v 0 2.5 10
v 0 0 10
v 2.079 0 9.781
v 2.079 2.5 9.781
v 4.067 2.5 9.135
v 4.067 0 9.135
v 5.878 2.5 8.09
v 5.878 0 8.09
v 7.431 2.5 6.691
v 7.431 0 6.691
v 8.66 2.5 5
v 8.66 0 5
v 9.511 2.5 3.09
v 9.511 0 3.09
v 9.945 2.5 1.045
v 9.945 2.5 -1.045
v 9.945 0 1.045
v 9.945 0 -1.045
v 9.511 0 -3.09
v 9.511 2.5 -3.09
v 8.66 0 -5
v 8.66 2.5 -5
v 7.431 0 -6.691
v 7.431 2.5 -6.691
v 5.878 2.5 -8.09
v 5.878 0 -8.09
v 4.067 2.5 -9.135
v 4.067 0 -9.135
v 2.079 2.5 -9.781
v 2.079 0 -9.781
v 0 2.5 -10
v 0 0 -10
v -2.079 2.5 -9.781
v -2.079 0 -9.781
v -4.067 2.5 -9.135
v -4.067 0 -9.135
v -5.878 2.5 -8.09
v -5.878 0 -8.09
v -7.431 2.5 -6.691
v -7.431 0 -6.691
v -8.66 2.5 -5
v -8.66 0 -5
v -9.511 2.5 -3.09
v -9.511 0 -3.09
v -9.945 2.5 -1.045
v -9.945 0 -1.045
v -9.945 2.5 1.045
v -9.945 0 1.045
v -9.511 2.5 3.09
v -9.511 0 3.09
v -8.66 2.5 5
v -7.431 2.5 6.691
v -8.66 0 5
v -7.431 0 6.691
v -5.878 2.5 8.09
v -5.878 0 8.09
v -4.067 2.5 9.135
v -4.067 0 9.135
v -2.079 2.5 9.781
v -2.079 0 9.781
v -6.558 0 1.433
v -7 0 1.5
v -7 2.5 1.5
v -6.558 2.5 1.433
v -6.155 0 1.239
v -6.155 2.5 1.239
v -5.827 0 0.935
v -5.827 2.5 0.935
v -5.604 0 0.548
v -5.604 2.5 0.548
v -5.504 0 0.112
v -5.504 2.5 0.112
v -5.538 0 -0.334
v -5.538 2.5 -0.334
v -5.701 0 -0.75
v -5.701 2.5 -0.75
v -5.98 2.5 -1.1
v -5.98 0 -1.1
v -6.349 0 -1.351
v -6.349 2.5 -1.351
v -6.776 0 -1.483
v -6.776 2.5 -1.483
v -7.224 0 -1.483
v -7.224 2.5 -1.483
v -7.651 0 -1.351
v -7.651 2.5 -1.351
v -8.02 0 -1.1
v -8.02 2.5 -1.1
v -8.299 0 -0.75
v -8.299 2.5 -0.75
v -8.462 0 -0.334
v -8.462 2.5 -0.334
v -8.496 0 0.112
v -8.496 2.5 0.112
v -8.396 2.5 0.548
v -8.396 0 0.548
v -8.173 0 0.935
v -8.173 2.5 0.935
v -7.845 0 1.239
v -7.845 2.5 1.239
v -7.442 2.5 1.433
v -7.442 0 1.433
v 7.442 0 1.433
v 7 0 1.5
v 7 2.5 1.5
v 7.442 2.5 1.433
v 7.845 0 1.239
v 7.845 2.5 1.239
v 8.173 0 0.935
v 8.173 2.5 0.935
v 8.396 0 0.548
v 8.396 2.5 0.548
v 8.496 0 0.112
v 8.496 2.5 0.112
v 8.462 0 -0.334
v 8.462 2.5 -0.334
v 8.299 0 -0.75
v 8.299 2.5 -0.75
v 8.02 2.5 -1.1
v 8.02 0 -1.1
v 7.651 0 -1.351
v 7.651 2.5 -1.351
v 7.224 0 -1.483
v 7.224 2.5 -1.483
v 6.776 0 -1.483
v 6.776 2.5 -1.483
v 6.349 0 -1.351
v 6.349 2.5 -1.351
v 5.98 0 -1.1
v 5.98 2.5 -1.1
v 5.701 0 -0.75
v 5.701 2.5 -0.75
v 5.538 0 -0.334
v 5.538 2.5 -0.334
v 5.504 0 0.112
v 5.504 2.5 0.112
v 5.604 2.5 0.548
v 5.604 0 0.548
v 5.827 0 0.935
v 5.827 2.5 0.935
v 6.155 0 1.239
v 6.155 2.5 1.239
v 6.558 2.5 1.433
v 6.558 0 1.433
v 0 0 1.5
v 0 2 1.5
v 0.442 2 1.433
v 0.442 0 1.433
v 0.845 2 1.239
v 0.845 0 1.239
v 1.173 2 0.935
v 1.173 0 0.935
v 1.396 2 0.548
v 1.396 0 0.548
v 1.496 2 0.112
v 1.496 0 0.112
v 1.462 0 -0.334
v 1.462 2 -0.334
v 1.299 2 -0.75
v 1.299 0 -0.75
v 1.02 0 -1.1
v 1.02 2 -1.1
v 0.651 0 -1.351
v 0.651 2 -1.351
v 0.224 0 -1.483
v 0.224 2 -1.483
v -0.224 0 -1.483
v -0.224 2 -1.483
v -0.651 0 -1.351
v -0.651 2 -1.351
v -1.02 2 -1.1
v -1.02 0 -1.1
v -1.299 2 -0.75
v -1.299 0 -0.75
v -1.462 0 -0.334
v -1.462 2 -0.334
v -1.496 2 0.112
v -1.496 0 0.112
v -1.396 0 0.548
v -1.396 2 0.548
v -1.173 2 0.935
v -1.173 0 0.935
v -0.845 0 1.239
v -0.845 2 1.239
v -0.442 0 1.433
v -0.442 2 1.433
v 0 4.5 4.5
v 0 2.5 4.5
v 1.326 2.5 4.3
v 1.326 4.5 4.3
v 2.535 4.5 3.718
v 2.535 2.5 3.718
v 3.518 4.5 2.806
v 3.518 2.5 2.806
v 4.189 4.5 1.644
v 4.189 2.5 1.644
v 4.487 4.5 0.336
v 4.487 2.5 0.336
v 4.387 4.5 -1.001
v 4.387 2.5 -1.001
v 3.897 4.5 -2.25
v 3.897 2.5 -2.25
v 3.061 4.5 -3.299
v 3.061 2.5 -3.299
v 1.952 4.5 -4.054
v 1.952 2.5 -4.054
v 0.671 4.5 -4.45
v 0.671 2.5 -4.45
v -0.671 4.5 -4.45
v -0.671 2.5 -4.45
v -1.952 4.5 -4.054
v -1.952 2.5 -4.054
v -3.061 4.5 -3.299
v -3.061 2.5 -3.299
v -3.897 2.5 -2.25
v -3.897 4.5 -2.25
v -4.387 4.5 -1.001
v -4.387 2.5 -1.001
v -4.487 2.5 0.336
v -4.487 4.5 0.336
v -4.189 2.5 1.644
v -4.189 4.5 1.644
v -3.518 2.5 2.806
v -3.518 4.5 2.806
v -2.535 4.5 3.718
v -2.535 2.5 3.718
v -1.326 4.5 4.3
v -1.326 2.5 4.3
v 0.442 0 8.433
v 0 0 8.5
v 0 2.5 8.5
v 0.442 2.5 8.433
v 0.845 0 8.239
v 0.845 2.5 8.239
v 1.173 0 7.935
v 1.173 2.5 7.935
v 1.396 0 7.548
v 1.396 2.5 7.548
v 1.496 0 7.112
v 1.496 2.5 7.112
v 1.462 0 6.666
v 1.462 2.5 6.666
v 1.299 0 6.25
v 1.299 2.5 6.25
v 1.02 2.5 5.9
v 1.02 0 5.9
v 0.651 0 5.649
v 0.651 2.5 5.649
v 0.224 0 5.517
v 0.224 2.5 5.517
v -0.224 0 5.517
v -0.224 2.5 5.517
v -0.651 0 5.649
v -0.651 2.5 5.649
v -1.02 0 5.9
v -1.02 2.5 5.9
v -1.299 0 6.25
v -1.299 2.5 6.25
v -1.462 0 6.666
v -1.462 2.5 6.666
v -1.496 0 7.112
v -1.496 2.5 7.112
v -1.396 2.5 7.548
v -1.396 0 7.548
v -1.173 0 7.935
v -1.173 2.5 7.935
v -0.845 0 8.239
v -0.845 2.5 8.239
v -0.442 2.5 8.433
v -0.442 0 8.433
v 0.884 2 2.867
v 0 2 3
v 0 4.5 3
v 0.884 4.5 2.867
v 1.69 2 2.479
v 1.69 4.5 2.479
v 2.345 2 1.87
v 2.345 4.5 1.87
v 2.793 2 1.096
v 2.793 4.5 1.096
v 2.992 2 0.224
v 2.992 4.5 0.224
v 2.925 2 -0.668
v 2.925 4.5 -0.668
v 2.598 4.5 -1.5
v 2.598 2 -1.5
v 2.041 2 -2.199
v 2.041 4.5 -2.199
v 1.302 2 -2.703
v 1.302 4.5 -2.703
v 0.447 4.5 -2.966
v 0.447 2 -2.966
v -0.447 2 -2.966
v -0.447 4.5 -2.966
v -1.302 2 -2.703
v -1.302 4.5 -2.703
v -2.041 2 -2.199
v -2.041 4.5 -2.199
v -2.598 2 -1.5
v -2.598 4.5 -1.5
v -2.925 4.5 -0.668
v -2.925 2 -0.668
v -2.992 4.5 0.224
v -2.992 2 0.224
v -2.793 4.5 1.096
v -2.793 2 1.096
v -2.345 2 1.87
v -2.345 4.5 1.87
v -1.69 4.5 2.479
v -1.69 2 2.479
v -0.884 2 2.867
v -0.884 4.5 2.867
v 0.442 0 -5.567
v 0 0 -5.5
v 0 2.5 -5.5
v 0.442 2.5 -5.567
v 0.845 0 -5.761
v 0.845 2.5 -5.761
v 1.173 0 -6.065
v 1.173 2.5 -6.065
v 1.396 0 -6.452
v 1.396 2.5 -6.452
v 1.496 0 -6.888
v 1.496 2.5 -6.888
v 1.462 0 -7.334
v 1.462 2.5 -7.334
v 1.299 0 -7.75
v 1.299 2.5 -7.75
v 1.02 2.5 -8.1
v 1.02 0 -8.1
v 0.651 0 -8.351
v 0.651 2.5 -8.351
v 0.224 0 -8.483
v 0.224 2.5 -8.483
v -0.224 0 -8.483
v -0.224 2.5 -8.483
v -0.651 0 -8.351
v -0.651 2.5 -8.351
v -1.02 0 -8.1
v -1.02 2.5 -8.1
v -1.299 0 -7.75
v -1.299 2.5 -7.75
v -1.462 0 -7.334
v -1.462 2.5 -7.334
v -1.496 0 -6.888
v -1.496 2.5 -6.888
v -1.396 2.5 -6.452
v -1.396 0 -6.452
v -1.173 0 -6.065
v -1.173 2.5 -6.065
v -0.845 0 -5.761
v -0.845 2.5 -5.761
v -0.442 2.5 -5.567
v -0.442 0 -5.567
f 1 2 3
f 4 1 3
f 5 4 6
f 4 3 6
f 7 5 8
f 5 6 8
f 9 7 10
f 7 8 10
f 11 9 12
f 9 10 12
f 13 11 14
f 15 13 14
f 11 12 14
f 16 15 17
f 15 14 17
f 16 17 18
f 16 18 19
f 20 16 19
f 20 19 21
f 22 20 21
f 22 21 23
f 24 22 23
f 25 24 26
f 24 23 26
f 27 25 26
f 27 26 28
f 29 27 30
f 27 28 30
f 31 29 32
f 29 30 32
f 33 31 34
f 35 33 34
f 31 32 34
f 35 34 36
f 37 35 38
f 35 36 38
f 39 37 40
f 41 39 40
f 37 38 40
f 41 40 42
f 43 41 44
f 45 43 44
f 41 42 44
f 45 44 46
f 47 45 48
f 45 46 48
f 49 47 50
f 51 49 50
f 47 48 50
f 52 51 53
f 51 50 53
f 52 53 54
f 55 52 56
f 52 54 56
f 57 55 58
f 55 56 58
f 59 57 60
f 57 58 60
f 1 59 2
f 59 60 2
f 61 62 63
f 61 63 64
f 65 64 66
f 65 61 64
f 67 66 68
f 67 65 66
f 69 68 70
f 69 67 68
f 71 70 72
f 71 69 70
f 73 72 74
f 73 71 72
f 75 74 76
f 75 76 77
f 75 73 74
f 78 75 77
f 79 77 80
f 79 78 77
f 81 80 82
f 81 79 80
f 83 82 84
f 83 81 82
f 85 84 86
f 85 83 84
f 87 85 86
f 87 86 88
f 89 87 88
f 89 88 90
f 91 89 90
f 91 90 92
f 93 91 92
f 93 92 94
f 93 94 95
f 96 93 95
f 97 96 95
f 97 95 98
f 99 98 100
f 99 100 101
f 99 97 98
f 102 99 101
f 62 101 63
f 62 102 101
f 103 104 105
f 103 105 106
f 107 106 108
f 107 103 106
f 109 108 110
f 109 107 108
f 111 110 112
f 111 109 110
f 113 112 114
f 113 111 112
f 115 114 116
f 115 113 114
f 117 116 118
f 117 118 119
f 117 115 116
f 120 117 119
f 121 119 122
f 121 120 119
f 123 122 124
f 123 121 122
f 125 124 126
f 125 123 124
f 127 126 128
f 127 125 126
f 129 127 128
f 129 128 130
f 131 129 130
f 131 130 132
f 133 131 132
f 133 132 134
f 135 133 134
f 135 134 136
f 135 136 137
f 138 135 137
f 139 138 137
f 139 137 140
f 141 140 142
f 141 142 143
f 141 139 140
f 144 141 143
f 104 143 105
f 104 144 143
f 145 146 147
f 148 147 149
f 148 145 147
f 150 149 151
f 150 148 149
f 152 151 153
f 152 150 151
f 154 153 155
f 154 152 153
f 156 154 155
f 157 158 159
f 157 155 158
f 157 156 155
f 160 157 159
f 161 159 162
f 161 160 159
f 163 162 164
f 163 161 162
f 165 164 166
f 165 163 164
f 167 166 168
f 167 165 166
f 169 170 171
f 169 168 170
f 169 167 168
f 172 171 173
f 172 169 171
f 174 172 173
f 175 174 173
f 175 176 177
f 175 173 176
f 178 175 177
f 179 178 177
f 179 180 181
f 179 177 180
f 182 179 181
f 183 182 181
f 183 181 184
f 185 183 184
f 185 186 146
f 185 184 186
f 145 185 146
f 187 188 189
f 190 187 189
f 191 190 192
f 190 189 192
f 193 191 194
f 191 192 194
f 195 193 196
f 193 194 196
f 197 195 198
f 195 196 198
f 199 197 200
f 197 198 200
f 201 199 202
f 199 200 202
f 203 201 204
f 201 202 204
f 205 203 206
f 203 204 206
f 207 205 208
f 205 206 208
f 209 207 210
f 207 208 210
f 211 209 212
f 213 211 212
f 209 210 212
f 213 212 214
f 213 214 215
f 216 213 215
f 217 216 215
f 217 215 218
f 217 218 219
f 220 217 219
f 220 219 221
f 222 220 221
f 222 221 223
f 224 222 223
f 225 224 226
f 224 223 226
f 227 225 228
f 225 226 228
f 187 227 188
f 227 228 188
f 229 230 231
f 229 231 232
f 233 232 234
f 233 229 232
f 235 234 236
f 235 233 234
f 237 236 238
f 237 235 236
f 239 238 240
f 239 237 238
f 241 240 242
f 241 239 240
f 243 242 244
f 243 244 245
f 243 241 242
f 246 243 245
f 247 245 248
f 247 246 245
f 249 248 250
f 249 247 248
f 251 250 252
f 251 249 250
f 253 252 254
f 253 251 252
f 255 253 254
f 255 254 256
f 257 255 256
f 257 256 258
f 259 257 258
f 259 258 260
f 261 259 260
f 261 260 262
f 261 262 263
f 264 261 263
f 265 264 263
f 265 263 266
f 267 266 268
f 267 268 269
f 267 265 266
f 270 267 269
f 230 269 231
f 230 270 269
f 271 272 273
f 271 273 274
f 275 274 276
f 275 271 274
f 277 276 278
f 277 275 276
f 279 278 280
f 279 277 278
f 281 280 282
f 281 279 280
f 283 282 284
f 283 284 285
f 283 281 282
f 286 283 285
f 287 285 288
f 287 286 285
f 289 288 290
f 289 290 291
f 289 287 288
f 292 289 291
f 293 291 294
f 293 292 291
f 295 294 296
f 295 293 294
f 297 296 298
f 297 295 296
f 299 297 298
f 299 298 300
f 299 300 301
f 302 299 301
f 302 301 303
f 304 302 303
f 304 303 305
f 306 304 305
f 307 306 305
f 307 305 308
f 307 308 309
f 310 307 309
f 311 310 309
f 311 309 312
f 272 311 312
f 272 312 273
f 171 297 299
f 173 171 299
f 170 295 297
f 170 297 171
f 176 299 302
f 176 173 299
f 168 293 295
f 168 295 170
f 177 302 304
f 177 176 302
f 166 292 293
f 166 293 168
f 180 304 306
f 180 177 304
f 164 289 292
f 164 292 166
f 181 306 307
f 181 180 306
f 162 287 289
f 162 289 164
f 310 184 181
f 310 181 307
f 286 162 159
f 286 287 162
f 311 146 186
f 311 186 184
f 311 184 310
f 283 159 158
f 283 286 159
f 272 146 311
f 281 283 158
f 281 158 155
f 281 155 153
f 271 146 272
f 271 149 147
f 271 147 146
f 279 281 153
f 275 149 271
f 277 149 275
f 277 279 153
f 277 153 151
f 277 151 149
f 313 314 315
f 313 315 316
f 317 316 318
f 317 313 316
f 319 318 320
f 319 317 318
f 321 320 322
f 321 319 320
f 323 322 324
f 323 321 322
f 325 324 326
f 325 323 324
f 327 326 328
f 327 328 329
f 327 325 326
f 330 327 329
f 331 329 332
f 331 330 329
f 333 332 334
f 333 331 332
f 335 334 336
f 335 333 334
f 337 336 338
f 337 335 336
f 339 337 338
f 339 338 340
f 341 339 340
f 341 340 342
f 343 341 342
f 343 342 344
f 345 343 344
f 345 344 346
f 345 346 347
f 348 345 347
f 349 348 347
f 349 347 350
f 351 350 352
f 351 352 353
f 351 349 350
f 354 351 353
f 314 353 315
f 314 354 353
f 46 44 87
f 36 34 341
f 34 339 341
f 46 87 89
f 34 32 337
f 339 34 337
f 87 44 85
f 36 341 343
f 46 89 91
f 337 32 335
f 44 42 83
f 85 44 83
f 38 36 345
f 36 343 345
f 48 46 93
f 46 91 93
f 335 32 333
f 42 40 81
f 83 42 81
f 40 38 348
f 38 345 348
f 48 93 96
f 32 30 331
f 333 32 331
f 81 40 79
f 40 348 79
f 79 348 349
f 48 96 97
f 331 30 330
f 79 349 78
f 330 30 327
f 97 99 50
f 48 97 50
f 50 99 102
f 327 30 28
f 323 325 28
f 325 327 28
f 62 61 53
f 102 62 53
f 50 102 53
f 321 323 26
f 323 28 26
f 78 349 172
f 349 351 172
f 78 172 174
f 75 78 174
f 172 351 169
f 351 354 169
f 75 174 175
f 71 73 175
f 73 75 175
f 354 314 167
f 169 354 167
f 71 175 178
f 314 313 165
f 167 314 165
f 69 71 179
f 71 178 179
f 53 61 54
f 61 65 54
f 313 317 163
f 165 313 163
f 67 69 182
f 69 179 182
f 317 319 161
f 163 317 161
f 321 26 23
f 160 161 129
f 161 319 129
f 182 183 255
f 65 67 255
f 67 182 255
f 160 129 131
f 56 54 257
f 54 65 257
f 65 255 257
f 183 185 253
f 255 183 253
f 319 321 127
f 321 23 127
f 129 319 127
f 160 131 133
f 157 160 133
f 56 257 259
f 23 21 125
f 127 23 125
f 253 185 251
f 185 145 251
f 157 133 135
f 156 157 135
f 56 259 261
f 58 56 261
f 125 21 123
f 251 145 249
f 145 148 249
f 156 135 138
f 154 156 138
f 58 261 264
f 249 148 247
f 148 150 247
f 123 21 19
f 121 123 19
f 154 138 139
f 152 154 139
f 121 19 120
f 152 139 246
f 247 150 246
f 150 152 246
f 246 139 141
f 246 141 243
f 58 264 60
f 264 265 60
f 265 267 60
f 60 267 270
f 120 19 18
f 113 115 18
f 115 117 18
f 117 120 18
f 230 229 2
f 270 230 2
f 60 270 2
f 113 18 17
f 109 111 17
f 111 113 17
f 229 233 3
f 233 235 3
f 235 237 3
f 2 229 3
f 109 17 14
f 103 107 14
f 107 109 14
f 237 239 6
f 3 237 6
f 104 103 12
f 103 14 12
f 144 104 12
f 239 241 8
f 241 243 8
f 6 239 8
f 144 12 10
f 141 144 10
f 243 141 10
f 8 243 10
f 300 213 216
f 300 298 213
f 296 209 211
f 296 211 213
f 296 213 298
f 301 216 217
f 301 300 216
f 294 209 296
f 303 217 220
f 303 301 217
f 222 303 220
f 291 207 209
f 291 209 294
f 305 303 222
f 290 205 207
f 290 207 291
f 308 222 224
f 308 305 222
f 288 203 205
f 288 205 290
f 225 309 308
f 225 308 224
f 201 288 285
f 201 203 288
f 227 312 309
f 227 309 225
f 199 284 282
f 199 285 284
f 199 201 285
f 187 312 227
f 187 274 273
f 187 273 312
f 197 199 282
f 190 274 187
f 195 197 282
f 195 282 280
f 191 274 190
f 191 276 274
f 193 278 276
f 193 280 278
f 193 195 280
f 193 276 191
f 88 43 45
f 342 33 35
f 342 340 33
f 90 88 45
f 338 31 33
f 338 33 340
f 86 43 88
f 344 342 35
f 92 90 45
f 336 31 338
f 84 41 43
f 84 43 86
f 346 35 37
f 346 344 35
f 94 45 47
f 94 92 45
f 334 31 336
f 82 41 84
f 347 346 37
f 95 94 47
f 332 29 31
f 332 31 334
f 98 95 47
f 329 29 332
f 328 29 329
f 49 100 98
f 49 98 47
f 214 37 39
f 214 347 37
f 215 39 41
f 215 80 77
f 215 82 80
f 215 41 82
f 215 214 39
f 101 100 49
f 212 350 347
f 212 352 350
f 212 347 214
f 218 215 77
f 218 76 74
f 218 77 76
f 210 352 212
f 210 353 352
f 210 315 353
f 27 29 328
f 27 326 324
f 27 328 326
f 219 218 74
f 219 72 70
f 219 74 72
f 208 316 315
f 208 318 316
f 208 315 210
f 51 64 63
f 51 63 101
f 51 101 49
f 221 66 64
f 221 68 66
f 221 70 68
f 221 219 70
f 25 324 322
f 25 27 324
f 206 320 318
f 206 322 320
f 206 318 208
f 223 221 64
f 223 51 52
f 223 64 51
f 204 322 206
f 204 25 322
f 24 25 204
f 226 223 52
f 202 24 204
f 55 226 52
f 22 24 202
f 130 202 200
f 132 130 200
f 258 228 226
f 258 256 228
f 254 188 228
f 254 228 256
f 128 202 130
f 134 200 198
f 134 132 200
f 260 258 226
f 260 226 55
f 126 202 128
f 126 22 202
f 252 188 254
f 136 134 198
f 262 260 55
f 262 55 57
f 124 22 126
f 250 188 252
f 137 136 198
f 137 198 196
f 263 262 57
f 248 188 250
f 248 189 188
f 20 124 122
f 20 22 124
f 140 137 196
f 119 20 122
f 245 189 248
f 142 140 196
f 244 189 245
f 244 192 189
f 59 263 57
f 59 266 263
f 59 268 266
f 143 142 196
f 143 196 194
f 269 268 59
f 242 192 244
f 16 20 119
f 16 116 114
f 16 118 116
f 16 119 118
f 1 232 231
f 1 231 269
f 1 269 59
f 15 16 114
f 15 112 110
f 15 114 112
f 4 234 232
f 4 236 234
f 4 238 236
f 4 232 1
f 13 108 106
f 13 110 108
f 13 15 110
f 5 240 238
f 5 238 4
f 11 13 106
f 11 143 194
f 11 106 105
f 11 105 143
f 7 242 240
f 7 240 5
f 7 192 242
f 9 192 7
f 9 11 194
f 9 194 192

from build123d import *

# Parameters (mm, degrees)
SKETCH_1_R          = 10
SKETCH_1_R_2        = 1.5
EXTRUDE_1_DEPTH     = 2.5
SKETCH_2_R          = 4.5
SKETCH_2_R_2        = 3
EXTRUDE_2_DEPTH     = 2
CUT_EXTRUDE_START   = -0.5
SKETCH_3_R          = 3
CUT_EXTRUDE_1_DEPTH = 0.5


with BuildPart() as part:
    # 草图1 → 凸台-拉伸1 (new body)
    with BuildSketch(Plane(origin=(0, 0, 0), x_dir=(1, 0, 0), z_dir=(0, 1, 0))):
        with Locations(Location((0, 0, 0), (0, 0, 270))):
            Circle(SKETCH_1_R)
        with Locations(Location((0, 0, 0), (0, 0, 270))):
            Circle(SKETCH_1_R_2, mode=Mode.SUBTRACT)
        with Locations(Location((0, 7, 0), (0, 0, 270))):
            Circle(SKETCH_1_R_2, mode=Mode.SUBTRACT)
        with Locations(Location((7, 0, 0), (0, 0, 270))):
            Circle(SKETCH_1_R_2, mode=Mode.SUBTRACT)
        with Locations(Location((0, -7, 0), (0, 0, 270))):
            Circle(SKETCH_1_R_2, mode=Mode.SUBTRACT)
        with Locations(Location((-7, 0, 0), (0, 0, 270))):
            Circle(SKETCH_1_R_2, mode=Mode.SUBTRACT)
    extrude(amount=EXTRUDE_1_DEPTH)

    # 草图2 → 凸台-拉伸2 (add)
    with BuildSketch(Plane(origin=(0, 2.5, 0), x_dir=(1, 0, 0), z_dir=(0, 1, 0))):
        with Locations(Location((0, 0, 0), (0, 0, 270))):
            Circle(SKETCH_2_R)
        with Locations(Location((0, 0, 0), (0, 0, 270))):
            Circle(SKETCH_2_R_2, mode=Mode.SUBTRACT)
    extrude(amount=EXTRUDE_2_DEPTH)

    # 草图3 → 切除-拉伸1 (cut)
    with BuildSketch(Plane(origin=(0, 2.5, 0), x_dir=(1, 0, 0), z_dir=(0, 1, 0)).offset(CUT_EXTRUDE_START)):
        with Locations(Location((0, 0, 0), (0, 0, 270))):
            Circle(SKETCH_3_R)
    extrude(amount=CUT_EXTRUDE_1_DEPTH, mode=Mode.SUBTRACT)


solid = part.part
